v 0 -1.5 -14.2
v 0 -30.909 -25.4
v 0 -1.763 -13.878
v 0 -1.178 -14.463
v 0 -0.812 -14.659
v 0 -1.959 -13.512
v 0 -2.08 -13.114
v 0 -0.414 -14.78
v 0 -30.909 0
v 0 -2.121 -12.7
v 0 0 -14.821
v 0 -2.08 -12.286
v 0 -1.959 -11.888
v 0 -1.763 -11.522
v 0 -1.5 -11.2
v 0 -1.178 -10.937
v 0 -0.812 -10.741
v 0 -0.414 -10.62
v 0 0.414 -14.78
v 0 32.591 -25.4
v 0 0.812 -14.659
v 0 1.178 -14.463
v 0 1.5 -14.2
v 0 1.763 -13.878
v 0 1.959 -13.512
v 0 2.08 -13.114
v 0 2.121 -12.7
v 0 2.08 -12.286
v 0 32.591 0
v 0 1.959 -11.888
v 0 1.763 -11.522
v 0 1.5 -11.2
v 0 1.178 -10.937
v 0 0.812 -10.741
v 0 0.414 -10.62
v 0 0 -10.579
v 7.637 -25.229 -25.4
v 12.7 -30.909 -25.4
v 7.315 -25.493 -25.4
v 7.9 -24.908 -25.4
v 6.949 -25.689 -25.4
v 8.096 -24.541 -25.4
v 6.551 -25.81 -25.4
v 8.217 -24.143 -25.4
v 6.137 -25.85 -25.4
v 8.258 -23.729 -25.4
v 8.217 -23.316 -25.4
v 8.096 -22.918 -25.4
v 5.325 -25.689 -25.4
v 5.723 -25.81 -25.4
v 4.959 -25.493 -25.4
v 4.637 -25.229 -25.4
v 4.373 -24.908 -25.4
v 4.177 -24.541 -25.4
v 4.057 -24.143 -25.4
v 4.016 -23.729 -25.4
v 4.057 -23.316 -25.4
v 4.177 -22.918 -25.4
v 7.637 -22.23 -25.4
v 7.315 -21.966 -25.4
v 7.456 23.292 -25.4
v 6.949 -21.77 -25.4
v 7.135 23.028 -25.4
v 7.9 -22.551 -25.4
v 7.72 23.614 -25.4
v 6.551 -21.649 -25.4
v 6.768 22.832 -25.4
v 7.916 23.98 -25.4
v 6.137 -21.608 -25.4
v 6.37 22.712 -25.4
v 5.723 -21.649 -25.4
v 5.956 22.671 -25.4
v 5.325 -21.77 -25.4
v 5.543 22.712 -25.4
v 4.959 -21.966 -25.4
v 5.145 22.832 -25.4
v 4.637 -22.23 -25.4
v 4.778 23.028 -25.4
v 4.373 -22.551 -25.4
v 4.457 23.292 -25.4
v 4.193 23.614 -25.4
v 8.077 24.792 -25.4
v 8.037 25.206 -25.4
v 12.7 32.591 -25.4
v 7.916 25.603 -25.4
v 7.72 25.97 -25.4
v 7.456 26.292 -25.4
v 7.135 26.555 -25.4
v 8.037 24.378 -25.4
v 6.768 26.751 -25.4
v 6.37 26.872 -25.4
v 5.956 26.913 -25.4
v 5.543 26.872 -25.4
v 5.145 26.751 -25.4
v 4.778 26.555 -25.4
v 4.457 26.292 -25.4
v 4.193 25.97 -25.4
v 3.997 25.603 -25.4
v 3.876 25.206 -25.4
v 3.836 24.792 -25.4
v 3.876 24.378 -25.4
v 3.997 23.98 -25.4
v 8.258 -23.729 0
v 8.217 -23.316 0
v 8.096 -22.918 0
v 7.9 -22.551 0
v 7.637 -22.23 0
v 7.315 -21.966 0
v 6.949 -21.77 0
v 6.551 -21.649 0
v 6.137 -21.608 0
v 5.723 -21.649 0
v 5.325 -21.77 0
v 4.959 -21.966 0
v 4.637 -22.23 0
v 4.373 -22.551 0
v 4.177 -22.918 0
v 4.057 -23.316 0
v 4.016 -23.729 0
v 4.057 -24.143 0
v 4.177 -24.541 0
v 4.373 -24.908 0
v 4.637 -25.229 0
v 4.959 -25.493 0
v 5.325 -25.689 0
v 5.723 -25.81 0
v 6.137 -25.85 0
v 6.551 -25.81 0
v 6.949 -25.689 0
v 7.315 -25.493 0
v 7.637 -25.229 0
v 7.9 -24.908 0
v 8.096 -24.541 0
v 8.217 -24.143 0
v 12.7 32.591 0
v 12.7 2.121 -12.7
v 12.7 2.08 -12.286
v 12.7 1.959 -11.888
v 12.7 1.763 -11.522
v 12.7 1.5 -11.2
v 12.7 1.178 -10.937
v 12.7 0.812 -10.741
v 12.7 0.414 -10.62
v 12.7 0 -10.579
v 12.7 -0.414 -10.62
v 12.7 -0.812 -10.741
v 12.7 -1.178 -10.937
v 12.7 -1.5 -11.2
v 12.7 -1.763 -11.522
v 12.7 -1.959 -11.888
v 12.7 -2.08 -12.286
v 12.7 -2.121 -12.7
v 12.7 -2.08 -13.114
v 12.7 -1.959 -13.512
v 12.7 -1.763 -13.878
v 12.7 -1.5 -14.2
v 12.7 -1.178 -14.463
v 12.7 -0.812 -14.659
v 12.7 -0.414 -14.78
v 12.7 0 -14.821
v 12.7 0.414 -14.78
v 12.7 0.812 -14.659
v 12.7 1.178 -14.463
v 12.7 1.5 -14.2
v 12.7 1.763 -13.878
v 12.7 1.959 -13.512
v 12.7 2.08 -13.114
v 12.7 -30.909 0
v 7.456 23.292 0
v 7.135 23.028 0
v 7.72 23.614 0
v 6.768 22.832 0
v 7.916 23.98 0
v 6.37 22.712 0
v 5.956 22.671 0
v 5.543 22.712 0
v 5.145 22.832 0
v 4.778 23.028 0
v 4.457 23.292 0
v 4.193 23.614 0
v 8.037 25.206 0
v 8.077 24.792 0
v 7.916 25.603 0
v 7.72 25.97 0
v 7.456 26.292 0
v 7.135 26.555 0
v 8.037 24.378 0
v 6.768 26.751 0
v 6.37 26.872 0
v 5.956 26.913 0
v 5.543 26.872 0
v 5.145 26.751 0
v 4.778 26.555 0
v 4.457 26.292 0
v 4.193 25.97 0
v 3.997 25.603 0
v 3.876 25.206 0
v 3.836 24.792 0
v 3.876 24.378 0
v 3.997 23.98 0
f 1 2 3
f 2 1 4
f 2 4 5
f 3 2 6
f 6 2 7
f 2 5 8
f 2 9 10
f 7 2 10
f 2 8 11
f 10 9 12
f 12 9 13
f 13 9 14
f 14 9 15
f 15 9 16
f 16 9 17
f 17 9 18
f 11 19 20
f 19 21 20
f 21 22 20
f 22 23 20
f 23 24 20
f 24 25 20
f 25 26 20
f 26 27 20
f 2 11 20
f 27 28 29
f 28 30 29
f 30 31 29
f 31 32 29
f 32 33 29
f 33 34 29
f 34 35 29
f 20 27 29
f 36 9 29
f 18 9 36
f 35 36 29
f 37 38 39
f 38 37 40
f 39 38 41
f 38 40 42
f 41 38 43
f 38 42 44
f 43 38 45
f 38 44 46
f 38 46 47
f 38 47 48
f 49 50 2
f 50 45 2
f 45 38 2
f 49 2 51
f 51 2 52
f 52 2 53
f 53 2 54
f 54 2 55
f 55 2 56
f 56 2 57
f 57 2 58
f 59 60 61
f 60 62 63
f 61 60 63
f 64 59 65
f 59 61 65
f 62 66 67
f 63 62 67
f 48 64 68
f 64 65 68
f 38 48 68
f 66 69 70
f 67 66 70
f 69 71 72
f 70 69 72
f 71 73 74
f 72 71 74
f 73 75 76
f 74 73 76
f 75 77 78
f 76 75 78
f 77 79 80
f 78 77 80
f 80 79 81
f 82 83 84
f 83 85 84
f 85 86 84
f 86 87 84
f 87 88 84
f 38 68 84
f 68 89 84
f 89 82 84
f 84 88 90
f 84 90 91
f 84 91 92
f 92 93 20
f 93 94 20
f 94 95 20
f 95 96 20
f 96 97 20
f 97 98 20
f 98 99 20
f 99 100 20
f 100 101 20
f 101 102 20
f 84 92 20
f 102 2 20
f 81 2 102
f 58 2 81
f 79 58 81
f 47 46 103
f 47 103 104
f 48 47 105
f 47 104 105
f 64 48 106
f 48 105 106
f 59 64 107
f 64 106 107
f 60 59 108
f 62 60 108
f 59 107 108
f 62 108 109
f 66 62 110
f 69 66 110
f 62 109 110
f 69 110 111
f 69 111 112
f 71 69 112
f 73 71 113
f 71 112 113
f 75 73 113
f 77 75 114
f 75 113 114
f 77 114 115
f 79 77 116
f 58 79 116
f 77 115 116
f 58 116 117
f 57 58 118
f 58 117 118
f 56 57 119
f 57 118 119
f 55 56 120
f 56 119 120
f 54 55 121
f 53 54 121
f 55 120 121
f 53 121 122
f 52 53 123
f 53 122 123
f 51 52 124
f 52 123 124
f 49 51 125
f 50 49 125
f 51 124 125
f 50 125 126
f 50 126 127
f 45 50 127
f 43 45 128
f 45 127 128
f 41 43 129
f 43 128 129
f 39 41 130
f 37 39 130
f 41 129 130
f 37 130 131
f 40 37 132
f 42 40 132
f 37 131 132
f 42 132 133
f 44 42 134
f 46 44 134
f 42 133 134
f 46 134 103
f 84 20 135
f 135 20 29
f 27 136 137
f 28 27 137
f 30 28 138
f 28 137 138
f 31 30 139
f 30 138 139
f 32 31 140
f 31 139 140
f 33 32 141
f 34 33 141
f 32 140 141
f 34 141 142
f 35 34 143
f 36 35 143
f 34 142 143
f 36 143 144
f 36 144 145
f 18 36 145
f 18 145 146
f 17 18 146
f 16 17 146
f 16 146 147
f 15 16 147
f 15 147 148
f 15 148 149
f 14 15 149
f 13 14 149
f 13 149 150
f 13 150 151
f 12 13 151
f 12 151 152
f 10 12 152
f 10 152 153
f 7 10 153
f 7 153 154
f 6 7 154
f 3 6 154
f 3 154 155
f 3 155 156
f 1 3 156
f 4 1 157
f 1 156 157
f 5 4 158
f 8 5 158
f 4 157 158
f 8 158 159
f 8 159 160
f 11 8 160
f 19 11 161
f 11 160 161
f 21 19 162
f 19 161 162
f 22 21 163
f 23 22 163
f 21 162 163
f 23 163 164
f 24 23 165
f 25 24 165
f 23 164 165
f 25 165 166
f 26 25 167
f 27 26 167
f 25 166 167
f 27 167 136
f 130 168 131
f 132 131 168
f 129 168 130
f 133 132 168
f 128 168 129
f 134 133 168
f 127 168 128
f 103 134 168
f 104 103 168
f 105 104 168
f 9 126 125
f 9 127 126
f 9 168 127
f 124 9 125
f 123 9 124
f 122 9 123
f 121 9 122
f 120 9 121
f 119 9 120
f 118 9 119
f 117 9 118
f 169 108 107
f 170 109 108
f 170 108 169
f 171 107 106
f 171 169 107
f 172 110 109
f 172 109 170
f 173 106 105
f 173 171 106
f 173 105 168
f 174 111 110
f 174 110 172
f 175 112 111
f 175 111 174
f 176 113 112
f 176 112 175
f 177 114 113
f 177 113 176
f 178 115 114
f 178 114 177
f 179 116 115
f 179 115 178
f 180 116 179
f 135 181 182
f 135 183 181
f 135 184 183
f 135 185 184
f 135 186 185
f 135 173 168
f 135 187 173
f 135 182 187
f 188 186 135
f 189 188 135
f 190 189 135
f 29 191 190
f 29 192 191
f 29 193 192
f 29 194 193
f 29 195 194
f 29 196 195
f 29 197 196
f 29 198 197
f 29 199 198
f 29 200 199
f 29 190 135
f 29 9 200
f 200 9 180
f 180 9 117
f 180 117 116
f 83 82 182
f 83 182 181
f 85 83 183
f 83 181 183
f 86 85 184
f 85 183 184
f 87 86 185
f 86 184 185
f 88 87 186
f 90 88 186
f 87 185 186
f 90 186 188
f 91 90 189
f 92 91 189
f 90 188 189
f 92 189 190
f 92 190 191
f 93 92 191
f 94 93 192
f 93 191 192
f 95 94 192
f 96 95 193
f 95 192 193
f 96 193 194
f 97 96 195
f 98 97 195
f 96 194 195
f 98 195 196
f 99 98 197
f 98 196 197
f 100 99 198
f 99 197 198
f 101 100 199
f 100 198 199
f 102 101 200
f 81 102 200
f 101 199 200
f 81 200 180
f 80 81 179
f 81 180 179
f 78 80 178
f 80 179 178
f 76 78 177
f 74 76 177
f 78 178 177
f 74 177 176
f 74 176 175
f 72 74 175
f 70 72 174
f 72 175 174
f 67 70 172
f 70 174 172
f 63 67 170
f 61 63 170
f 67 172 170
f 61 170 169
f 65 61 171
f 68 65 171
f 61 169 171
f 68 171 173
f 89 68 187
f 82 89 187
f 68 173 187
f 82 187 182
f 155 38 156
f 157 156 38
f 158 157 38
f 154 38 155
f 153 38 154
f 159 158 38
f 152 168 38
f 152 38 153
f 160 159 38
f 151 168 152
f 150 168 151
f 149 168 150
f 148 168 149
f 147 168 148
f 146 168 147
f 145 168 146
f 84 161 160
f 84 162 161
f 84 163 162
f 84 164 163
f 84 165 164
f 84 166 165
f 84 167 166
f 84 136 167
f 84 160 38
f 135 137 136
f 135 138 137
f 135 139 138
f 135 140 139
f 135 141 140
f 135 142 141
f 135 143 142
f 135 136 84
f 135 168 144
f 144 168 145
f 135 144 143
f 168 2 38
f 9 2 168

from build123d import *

# Parameters (mm, degrees)
F0_W     = 63.5
F0_H     = 25.4
F1_DEPTH = 12.7
F2_R     = 2.1209
F3_DEPTH = 25.4
F4_R     = 2.1209
F5_DEPTH = 25.4
F6_R     = 2.1209
F7_DEPTH = 25.4


with BuildPart() as f1:
    # F0 (on Right) → F1 (new body)
    with BuildSketch(Plane.YZ):
        with Locations((0.840706, -12.7)):
            Rectangle(F0_W, F0_H)
    extrude(amount=F1_DEPTH)

    # F2 (on face) → F3 (cut)
    with BuildSketch(Plane.XY):
        with Locations((5.956479, 24.791827)):
            Circle(F2_R)
    extrude(amount=-F3_DEPTH, mode=Mode.SUBTRACT)

    # F4 (on face) → F5 (cut)
    with BuildSketch(Plane.XY):
        with Locations((6.136879, -23.729375)):
            Circle(F4_R)
    extrude(amount=-F5_DEPTH, mode=Mode.SUBTRACT)

    # F6 (on face) → F7 (cut)
    with BuildSketch(Plane.YZ.offset(12.7)):
        with Locations((0, -12.7)):
            Circle(F6_R)
    extrude(amount=-F7_DEPTH, mode=Mode.SUBTRACT)


solid = f1.part
